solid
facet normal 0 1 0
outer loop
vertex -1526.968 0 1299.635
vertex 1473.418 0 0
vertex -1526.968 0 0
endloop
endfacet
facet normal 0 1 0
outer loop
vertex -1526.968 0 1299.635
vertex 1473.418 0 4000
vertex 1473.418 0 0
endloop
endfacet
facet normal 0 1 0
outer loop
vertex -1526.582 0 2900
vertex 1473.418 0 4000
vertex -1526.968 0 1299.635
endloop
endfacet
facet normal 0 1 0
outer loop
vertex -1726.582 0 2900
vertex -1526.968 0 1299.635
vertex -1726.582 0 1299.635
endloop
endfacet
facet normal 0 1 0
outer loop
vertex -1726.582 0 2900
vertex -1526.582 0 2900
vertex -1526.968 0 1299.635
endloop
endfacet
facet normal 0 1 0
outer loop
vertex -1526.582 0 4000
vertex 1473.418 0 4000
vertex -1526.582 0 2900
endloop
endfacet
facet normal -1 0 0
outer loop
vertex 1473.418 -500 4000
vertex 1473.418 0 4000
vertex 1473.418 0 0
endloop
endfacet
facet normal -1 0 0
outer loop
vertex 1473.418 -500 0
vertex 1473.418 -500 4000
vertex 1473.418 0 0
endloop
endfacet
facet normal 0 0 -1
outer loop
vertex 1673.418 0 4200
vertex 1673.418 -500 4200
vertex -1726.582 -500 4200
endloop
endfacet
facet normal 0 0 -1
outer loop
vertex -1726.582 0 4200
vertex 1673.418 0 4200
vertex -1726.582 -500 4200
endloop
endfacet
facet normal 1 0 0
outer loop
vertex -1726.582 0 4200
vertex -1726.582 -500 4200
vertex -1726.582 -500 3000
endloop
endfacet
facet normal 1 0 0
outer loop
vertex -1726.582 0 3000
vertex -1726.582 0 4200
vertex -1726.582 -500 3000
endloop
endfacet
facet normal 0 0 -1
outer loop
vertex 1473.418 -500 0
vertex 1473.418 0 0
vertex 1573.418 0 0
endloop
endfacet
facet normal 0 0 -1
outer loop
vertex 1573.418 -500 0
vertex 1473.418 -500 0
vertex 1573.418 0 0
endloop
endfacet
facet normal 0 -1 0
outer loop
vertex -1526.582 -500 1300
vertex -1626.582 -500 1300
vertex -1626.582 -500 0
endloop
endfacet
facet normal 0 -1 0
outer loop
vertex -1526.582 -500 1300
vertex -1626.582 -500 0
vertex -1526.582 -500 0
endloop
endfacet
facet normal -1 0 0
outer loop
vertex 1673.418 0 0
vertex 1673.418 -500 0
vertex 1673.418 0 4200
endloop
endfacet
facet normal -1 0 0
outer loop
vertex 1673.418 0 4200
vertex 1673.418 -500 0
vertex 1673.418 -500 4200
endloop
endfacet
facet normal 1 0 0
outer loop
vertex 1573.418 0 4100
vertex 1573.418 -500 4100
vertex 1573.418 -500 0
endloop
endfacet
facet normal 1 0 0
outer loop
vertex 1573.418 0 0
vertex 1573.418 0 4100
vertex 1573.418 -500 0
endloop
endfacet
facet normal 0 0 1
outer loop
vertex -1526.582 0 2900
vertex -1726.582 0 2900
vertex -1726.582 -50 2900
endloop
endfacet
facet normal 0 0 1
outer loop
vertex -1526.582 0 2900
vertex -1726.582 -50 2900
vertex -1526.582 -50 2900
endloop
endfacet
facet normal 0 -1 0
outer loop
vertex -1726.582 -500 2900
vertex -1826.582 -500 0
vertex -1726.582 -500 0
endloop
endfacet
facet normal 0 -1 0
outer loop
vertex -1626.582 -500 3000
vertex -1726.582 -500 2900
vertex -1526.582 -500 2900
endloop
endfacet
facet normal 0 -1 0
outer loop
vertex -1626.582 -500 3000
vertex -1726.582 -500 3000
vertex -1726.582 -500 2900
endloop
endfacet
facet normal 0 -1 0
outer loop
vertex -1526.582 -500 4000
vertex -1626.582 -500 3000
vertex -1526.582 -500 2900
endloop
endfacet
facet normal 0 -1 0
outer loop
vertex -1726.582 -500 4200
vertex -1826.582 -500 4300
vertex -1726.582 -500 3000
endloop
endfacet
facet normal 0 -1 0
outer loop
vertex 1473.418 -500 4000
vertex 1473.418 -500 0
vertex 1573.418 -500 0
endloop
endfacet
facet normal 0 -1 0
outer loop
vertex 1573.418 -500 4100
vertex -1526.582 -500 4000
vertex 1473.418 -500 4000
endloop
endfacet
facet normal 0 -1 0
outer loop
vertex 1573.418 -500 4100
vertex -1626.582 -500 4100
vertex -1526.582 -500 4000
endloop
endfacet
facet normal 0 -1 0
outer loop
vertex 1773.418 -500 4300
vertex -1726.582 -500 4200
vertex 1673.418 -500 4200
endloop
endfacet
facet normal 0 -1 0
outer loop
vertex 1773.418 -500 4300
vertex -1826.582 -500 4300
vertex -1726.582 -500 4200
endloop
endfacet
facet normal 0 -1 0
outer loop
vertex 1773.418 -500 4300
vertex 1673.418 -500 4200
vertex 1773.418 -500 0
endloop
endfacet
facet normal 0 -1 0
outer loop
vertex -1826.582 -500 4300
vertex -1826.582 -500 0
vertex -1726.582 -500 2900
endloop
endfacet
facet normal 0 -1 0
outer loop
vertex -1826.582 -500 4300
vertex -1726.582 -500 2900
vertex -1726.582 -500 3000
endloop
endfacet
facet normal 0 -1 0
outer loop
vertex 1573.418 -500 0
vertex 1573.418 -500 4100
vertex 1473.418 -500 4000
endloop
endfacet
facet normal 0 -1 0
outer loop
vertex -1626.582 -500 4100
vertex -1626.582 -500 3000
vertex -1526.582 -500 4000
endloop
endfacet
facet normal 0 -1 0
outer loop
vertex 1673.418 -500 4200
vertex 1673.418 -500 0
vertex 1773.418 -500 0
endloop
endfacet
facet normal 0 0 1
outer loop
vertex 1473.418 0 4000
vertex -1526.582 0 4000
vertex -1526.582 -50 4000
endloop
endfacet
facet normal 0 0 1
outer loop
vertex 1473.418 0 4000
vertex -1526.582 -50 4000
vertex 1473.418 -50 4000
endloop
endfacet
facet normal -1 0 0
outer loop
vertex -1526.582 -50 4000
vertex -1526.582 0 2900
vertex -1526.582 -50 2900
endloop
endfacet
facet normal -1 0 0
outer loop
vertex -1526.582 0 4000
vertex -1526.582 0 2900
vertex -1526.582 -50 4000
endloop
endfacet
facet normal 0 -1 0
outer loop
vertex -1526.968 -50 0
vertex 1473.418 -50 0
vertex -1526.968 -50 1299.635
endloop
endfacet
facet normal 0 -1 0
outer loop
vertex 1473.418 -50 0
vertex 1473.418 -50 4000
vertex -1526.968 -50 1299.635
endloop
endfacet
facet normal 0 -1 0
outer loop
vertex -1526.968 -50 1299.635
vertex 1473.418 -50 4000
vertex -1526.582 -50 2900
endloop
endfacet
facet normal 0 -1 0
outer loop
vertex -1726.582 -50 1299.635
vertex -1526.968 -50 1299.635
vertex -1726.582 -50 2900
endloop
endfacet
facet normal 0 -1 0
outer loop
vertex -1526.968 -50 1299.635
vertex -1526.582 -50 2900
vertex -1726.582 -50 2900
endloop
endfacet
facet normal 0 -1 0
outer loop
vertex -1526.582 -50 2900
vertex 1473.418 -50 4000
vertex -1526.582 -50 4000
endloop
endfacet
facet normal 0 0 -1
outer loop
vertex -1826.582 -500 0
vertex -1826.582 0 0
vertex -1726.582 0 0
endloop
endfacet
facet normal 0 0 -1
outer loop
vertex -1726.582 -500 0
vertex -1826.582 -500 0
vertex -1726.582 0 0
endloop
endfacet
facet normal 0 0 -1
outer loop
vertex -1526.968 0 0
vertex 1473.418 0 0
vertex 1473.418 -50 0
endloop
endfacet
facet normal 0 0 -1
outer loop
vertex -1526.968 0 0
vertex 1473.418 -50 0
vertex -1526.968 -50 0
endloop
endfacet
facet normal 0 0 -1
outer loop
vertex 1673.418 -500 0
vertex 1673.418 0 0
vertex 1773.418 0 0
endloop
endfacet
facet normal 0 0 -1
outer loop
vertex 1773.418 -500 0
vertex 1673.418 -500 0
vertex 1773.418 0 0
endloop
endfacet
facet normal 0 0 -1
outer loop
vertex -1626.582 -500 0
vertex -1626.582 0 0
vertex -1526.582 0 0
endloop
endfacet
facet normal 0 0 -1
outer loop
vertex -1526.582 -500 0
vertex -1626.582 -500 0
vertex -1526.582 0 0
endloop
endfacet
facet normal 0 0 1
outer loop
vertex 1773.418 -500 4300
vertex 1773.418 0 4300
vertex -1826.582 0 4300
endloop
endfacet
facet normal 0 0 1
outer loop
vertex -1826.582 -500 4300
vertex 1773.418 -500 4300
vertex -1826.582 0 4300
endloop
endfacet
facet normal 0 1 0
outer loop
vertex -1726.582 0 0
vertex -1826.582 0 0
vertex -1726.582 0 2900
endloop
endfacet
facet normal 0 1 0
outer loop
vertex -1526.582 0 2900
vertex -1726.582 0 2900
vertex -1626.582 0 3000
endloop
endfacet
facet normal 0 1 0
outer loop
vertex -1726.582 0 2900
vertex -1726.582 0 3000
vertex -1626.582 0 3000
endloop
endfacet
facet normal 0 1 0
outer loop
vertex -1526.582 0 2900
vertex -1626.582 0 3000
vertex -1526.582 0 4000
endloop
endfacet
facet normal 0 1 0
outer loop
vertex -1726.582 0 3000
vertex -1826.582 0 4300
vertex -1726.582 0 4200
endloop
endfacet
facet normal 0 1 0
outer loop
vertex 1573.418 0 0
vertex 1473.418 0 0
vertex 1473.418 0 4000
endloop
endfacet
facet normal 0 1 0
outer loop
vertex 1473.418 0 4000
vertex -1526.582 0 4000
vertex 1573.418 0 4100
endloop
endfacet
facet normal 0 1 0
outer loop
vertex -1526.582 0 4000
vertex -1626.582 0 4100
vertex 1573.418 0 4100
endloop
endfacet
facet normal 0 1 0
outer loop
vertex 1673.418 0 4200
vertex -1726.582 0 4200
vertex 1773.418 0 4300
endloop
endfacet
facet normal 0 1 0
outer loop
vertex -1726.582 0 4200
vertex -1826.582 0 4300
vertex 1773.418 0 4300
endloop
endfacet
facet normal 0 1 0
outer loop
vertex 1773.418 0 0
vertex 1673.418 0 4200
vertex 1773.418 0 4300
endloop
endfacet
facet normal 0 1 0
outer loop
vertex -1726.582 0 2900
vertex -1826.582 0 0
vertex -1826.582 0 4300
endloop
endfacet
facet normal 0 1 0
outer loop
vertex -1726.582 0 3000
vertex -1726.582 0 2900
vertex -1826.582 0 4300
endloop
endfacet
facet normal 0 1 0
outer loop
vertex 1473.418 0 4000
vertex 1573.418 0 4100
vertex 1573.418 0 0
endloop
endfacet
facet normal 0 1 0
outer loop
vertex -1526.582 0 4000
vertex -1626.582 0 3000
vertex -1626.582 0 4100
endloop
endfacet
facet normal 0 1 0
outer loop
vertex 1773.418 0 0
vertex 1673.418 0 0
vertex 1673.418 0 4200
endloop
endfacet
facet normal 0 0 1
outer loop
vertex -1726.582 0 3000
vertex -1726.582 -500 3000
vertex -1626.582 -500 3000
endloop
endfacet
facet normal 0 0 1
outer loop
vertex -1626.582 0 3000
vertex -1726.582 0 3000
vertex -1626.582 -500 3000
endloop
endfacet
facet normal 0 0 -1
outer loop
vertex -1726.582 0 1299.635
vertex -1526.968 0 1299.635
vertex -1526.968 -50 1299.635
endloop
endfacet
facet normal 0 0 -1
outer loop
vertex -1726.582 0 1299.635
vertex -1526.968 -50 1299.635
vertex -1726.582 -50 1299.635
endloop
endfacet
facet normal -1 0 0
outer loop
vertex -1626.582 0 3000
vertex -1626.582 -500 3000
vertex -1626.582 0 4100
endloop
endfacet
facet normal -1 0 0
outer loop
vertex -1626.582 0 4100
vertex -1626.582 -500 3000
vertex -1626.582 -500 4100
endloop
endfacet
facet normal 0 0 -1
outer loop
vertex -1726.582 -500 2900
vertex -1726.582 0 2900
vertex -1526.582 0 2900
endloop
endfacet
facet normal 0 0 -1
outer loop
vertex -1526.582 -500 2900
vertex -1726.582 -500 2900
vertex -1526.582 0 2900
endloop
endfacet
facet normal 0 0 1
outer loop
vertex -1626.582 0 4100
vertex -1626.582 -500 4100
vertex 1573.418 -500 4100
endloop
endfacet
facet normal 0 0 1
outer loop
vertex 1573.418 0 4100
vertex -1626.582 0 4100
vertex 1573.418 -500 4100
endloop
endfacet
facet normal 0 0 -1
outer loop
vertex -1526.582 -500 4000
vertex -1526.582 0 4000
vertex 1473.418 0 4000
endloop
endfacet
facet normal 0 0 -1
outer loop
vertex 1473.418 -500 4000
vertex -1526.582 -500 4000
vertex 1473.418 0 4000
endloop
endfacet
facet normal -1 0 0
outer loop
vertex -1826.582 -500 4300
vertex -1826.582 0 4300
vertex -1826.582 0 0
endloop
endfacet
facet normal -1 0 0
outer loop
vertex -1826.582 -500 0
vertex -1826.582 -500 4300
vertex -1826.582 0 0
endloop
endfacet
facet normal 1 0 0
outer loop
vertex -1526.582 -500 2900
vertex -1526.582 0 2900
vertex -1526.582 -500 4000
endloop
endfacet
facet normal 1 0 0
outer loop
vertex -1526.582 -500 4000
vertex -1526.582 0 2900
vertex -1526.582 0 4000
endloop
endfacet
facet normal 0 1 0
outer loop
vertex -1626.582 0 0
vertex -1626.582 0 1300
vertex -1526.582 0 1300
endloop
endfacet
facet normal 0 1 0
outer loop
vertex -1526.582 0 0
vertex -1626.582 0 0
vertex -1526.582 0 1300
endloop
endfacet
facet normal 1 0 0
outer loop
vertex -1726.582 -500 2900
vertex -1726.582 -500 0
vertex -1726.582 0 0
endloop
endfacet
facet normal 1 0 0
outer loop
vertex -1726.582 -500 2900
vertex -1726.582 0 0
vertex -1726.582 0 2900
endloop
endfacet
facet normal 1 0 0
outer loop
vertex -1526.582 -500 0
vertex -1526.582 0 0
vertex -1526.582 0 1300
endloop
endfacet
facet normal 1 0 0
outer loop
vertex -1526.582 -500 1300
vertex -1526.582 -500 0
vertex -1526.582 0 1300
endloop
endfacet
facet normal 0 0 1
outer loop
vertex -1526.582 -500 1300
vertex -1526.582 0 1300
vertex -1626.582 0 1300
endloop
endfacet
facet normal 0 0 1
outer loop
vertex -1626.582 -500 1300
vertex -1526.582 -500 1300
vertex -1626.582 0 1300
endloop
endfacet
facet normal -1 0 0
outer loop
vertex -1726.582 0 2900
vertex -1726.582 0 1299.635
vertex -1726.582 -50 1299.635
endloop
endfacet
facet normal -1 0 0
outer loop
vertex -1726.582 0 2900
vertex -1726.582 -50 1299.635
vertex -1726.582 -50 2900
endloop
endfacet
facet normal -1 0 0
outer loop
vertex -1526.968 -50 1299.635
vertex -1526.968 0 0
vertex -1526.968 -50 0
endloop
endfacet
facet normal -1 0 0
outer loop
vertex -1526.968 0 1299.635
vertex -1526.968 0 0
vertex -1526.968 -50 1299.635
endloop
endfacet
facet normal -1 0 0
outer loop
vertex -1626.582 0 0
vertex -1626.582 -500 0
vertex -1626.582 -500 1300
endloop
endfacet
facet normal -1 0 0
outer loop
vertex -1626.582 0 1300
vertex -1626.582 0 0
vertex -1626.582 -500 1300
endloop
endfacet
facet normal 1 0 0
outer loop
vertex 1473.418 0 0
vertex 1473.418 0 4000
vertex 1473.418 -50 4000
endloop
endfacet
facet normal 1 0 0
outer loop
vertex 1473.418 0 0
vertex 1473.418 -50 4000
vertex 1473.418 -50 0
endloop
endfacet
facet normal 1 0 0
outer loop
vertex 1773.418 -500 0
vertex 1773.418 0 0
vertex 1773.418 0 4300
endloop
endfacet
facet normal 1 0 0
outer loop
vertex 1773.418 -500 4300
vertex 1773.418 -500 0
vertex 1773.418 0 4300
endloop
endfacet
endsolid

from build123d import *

# Parameters (mm, degrees)
F1_DEPTH = 500
F2_W     = 100
F2_H     = 1300
F3_DEPTH = 500.001
F5_DEPTH = 50


with BuildPart() as f1:
    # F0 (on Front) → F1 (new body)
    with BuildSketch(Plane.XZ):
        Polygon((-1826.582307, 4300), (-1826.582307, 0), (-1526.582307, 0), (-1526.582307, 1300), (-1726.582307, 1300), (-1726.582307, 2900), (-1526.582307, 2900), (-1526.582307, 4000), (1473.417693, 4000), (1473.417693, 0), (1773.417693, 0), (1773.417693, 4300), align=None)
    extrude(amount=F1_DEPTH)

    # F2 (on face) → F3 (cut, through all)
    with BuildSketch(Plane.XZ.offset(500)):
        Polygon((-1726.582307, 4200), (-1726.582307, 3000), (-1626.582307, 3000), (-1626.582307, 4100), (1573.417693, 4100), (1573.417693, 0), (1673.417693, 0), (1673.417693, 4200), align=None)
        with Locations((-1676.582307, 650)):
            Rectangle(F2_W, F2_H)
    extrude(amount=-F3_DEPTH, mode=Mode.SUBTRACT)


with BuildPart() as f5:
    # F4 (on face) → F5 (new body)
    with BuildSketch(Plane(origin=(0, 0, 0), x_dir=(-1, 0, 0), z_dir=(0, 1, 0))):
        Polygon((-1473.417693, 0), (1526.967645, 0), (1526.967645, 1299.635053), (1726.582307, 1299.635053), (1726.582307, 2900), (1526.582307, 2900), (1526.582307, 4000), (-1473.417693, 4000), align=None)
    extrude(amount=-F5_DEPTH)


solid = Compound([f1.part, f5.part])
